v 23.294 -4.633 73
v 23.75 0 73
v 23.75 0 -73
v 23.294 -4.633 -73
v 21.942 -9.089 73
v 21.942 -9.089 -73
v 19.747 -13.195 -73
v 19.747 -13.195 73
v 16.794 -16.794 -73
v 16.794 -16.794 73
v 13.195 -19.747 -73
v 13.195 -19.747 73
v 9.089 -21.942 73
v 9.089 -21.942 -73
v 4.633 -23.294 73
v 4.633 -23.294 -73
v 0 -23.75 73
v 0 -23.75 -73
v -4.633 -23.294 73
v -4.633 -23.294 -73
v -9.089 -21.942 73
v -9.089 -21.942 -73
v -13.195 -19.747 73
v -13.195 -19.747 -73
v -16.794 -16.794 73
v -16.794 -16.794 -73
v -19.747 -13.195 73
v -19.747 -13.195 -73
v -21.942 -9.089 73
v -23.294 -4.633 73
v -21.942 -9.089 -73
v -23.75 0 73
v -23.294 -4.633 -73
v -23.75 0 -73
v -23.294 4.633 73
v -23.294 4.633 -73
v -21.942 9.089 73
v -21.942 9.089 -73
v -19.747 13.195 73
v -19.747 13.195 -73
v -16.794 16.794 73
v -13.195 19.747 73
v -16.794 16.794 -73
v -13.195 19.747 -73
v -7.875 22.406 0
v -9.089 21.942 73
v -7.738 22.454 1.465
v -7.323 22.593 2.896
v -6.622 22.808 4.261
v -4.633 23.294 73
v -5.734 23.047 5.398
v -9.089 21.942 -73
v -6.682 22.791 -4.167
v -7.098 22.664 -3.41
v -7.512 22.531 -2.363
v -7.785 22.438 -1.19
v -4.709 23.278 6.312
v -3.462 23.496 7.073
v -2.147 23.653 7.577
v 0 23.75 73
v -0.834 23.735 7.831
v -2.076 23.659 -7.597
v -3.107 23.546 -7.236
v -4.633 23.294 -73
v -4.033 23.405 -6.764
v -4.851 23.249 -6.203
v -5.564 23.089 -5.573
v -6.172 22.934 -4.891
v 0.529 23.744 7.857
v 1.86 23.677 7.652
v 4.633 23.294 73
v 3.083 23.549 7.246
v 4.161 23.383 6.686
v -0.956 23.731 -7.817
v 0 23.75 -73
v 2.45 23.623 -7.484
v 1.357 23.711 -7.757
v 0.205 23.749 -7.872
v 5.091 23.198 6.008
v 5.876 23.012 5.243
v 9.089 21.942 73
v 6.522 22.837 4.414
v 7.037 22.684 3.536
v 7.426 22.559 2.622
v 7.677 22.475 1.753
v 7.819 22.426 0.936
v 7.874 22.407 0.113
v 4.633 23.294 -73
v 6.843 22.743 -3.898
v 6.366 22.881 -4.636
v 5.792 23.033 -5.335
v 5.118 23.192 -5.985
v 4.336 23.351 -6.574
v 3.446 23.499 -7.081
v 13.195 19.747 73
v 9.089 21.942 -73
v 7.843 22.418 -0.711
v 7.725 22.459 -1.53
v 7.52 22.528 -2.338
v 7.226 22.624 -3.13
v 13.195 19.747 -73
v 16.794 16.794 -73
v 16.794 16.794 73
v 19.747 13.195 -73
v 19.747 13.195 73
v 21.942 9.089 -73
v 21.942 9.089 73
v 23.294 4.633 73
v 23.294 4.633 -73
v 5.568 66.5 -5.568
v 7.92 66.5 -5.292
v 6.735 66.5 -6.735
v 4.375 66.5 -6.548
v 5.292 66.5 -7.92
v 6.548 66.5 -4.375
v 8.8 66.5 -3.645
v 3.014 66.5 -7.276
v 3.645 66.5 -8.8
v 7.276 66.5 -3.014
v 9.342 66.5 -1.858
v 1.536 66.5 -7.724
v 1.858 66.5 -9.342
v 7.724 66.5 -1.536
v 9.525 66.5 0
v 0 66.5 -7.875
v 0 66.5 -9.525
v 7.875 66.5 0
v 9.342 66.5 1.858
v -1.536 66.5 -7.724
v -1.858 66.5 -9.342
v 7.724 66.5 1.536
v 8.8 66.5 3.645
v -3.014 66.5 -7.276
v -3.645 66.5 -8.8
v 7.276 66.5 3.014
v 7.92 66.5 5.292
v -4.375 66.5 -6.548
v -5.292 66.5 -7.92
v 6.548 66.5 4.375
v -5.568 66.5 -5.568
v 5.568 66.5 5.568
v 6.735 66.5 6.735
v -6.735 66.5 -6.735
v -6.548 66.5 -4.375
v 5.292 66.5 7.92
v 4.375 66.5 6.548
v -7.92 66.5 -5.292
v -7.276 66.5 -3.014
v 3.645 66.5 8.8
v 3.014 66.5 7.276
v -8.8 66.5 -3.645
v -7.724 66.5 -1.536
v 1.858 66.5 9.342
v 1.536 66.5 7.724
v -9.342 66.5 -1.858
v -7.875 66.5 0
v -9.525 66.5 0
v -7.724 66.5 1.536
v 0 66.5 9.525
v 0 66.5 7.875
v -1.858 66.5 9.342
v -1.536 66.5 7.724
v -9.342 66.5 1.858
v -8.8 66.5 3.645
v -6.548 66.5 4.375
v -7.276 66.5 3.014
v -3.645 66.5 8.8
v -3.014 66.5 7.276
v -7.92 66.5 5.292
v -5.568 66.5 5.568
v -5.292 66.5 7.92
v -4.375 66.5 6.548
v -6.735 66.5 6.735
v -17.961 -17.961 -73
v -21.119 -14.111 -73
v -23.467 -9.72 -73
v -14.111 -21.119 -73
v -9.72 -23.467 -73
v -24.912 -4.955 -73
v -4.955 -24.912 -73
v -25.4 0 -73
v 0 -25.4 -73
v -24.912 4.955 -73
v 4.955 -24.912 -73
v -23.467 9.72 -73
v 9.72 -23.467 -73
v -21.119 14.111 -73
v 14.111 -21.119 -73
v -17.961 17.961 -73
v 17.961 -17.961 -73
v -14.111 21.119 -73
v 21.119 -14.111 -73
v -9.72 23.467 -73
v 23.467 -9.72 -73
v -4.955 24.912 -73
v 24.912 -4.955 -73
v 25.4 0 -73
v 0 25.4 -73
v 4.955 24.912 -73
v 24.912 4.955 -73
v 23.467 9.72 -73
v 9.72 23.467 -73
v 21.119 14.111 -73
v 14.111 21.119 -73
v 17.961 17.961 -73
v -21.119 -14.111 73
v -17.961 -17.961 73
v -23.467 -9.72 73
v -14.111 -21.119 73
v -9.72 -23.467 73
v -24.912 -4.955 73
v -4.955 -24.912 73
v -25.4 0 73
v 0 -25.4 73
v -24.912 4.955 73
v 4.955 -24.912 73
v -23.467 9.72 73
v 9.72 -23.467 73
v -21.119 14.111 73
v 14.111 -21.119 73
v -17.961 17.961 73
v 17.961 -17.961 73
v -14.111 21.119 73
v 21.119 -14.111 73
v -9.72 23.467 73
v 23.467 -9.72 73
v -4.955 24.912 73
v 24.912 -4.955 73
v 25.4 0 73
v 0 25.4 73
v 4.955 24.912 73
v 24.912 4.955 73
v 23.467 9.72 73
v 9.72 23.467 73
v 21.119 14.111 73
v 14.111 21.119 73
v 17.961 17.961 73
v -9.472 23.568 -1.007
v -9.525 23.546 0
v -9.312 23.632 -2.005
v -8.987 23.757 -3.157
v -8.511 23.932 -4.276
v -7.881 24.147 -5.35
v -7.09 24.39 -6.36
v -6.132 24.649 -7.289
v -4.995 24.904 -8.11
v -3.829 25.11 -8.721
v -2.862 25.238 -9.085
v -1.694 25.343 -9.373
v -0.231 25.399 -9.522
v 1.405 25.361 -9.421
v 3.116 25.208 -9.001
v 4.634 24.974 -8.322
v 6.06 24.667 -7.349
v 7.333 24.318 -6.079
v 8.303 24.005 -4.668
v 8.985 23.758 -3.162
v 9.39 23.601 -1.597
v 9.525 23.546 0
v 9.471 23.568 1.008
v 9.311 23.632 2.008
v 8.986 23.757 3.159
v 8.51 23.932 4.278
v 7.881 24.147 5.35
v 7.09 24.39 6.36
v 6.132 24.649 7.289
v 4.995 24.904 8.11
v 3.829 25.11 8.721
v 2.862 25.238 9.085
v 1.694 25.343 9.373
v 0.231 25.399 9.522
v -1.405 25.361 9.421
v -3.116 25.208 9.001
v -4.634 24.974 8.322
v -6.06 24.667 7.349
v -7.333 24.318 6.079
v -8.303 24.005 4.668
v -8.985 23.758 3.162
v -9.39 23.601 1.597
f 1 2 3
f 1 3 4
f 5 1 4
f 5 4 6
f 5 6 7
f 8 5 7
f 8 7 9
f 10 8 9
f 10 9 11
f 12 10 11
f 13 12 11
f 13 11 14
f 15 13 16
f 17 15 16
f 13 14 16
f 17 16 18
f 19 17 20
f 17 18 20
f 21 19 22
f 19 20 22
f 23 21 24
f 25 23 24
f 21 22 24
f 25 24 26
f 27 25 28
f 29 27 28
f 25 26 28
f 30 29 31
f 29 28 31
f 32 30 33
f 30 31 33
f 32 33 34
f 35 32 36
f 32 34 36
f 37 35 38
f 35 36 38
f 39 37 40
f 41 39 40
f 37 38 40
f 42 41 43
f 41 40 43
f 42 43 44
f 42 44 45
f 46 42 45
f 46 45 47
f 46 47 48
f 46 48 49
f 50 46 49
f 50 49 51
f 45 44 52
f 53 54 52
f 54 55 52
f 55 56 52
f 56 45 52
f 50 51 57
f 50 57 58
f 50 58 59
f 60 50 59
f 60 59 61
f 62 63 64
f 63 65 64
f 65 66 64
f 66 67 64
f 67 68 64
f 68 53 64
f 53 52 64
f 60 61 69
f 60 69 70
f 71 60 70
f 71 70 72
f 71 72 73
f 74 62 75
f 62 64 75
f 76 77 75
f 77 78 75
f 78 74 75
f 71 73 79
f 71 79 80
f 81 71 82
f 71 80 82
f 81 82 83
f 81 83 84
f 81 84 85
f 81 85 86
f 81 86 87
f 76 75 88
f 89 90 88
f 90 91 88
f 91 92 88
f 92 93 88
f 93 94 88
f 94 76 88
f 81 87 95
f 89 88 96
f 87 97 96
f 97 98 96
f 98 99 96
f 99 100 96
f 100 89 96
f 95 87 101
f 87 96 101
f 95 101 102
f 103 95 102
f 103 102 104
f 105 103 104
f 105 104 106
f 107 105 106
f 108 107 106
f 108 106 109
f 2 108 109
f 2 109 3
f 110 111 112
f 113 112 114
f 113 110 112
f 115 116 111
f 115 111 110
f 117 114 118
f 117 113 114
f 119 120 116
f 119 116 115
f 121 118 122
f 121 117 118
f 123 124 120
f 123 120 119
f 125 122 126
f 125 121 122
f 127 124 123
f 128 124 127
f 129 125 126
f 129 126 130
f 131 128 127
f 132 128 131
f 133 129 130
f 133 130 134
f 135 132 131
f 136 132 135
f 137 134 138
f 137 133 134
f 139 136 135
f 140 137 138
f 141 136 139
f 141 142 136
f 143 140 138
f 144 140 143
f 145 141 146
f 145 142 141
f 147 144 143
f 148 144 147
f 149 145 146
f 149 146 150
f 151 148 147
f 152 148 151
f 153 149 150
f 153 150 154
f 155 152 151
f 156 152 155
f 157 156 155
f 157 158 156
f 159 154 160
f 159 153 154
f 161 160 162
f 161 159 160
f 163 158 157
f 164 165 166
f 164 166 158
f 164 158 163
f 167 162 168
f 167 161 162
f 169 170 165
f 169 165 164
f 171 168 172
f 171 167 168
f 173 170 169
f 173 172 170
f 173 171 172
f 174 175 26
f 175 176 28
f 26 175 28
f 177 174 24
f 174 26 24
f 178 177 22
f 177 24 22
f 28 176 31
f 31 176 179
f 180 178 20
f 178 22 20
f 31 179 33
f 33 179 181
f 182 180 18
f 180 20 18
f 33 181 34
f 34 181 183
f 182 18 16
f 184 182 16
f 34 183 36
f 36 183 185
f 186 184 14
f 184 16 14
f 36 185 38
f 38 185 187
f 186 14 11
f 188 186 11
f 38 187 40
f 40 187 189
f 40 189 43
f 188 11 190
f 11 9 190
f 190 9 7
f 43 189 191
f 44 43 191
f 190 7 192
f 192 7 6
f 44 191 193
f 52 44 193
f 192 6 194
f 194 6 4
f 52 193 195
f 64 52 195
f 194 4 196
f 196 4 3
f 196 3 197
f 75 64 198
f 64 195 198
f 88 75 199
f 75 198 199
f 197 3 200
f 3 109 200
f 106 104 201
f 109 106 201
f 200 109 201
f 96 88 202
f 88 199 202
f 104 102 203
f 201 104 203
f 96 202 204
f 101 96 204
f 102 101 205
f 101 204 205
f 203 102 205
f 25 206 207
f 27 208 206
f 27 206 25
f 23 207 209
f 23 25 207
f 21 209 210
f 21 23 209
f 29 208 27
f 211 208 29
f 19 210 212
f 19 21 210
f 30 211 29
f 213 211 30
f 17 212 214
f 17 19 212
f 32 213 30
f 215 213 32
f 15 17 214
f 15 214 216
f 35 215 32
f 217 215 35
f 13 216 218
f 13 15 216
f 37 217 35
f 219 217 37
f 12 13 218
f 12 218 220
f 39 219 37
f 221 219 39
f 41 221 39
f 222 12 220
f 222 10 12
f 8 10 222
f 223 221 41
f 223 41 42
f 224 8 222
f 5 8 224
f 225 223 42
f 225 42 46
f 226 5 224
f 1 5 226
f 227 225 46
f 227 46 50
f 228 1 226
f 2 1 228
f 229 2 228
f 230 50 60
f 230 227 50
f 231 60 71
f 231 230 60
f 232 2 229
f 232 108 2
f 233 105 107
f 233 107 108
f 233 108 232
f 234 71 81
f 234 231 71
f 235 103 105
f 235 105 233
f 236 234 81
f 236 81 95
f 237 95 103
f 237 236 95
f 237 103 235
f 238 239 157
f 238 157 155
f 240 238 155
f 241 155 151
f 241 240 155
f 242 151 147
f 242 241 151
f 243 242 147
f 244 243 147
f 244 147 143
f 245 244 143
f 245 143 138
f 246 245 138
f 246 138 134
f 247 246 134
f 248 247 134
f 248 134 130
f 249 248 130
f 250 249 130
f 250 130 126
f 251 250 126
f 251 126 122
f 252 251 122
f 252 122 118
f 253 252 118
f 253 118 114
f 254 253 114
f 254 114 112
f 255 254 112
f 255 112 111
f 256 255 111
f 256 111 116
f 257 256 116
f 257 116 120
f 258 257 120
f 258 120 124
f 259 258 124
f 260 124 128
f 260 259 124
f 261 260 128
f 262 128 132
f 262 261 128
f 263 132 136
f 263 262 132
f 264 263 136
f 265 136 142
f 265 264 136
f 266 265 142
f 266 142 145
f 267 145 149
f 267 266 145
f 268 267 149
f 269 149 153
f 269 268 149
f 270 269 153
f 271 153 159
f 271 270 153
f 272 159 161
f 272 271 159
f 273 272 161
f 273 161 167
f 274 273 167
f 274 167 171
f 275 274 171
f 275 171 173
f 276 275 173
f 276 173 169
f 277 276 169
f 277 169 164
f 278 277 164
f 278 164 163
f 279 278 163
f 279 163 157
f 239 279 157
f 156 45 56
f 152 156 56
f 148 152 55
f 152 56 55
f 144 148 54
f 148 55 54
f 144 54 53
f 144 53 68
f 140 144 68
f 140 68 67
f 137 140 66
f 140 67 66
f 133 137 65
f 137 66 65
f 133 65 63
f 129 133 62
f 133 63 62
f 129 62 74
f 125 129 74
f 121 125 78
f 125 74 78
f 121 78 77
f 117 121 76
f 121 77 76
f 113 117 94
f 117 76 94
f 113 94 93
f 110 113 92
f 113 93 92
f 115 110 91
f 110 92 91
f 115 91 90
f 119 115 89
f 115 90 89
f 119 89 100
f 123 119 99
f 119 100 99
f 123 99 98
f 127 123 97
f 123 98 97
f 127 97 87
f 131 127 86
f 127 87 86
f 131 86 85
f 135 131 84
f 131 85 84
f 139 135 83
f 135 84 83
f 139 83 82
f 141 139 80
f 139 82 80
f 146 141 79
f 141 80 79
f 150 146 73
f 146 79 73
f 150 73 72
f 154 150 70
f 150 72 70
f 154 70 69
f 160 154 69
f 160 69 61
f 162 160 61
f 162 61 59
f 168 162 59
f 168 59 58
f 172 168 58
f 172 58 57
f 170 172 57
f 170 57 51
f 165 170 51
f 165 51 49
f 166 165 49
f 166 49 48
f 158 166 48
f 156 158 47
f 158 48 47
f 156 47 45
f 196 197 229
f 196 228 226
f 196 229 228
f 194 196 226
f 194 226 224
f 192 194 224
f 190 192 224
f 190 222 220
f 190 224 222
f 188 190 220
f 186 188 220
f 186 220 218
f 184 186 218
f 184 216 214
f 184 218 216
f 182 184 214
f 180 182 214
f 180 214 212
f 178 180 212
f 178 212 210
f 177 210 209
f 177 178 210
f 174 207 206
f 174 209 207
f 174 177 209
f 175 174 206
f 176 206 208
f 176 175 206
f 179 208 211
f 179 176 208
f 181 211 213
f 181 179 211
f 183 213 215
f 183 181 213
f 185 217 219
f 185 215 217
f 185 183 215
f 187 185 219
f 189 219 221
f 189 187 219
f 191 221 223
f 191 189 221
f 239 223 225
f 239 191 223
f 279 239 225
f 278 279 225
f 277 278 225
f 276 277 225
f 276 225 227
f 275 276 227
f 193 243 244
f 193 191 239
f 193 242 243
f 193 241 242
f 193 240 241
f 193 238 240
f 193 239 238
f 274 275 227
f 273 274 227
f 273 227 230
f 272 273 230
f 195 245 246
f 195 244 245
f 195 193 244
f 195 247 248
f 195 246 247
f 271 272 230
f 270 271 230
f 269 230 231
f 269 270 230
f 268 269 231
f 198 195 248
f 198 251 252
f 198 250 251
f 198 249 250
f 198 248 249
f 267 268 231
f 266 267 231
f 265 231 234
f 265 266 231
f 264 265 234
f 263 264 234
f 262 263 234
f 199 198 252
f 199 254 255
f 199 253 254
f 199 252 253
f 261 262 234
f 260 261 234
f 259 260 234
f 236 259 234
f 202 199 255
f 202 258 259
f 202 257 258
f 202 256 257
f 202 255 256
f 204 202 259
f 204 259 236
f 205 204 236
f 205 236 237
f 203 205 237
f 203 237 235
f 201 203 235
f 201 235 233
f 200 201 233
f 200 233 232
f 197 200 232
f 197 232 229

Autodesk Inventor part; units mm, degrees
ref_plane "YZ Plane" through (0, 0, 0) normal (1, 0, 0) x (0, 1, 0)
ref_plane "XZ Plane" through (0, 0, 0) normal (0, 1, 0) x (-1, 0, 0)
ref_plane "XY Plane" through (0, 0, 0) normal (0, 0, 1) x (1, 0, 0)
sketch "Sketch1" plane through (0, 0, 0) normal (0, 0, 1) x (1, 0, 0)
  circle A0 centre (0, 0) radius 25.4
  dimension "d0" = 50.8
extrude "Extrusion1" add sketch "Sketch1" along normal mid plane 146
sketch "Sketch2" plane through (0, 0, 0) normal (0, 1, 0) x (-1, 0, 0)
  circle A0 centre (0, 0) radius 9.525
  dimension "d3" = 19.05
extrude "Extrusion2" add sketch "Sketch2" along normal blind 66.5
shell "Shell1" thickness 1.65 removed faces 3 at (2.8113, 66.5, 0.0442) at (-7.2508, -1.9085, 73) at (-7.2508, -1.9085, -73)
properties part number "ASME BPE - RED TEE-50.8-19.05" material "Stainless Steel, 316L"
